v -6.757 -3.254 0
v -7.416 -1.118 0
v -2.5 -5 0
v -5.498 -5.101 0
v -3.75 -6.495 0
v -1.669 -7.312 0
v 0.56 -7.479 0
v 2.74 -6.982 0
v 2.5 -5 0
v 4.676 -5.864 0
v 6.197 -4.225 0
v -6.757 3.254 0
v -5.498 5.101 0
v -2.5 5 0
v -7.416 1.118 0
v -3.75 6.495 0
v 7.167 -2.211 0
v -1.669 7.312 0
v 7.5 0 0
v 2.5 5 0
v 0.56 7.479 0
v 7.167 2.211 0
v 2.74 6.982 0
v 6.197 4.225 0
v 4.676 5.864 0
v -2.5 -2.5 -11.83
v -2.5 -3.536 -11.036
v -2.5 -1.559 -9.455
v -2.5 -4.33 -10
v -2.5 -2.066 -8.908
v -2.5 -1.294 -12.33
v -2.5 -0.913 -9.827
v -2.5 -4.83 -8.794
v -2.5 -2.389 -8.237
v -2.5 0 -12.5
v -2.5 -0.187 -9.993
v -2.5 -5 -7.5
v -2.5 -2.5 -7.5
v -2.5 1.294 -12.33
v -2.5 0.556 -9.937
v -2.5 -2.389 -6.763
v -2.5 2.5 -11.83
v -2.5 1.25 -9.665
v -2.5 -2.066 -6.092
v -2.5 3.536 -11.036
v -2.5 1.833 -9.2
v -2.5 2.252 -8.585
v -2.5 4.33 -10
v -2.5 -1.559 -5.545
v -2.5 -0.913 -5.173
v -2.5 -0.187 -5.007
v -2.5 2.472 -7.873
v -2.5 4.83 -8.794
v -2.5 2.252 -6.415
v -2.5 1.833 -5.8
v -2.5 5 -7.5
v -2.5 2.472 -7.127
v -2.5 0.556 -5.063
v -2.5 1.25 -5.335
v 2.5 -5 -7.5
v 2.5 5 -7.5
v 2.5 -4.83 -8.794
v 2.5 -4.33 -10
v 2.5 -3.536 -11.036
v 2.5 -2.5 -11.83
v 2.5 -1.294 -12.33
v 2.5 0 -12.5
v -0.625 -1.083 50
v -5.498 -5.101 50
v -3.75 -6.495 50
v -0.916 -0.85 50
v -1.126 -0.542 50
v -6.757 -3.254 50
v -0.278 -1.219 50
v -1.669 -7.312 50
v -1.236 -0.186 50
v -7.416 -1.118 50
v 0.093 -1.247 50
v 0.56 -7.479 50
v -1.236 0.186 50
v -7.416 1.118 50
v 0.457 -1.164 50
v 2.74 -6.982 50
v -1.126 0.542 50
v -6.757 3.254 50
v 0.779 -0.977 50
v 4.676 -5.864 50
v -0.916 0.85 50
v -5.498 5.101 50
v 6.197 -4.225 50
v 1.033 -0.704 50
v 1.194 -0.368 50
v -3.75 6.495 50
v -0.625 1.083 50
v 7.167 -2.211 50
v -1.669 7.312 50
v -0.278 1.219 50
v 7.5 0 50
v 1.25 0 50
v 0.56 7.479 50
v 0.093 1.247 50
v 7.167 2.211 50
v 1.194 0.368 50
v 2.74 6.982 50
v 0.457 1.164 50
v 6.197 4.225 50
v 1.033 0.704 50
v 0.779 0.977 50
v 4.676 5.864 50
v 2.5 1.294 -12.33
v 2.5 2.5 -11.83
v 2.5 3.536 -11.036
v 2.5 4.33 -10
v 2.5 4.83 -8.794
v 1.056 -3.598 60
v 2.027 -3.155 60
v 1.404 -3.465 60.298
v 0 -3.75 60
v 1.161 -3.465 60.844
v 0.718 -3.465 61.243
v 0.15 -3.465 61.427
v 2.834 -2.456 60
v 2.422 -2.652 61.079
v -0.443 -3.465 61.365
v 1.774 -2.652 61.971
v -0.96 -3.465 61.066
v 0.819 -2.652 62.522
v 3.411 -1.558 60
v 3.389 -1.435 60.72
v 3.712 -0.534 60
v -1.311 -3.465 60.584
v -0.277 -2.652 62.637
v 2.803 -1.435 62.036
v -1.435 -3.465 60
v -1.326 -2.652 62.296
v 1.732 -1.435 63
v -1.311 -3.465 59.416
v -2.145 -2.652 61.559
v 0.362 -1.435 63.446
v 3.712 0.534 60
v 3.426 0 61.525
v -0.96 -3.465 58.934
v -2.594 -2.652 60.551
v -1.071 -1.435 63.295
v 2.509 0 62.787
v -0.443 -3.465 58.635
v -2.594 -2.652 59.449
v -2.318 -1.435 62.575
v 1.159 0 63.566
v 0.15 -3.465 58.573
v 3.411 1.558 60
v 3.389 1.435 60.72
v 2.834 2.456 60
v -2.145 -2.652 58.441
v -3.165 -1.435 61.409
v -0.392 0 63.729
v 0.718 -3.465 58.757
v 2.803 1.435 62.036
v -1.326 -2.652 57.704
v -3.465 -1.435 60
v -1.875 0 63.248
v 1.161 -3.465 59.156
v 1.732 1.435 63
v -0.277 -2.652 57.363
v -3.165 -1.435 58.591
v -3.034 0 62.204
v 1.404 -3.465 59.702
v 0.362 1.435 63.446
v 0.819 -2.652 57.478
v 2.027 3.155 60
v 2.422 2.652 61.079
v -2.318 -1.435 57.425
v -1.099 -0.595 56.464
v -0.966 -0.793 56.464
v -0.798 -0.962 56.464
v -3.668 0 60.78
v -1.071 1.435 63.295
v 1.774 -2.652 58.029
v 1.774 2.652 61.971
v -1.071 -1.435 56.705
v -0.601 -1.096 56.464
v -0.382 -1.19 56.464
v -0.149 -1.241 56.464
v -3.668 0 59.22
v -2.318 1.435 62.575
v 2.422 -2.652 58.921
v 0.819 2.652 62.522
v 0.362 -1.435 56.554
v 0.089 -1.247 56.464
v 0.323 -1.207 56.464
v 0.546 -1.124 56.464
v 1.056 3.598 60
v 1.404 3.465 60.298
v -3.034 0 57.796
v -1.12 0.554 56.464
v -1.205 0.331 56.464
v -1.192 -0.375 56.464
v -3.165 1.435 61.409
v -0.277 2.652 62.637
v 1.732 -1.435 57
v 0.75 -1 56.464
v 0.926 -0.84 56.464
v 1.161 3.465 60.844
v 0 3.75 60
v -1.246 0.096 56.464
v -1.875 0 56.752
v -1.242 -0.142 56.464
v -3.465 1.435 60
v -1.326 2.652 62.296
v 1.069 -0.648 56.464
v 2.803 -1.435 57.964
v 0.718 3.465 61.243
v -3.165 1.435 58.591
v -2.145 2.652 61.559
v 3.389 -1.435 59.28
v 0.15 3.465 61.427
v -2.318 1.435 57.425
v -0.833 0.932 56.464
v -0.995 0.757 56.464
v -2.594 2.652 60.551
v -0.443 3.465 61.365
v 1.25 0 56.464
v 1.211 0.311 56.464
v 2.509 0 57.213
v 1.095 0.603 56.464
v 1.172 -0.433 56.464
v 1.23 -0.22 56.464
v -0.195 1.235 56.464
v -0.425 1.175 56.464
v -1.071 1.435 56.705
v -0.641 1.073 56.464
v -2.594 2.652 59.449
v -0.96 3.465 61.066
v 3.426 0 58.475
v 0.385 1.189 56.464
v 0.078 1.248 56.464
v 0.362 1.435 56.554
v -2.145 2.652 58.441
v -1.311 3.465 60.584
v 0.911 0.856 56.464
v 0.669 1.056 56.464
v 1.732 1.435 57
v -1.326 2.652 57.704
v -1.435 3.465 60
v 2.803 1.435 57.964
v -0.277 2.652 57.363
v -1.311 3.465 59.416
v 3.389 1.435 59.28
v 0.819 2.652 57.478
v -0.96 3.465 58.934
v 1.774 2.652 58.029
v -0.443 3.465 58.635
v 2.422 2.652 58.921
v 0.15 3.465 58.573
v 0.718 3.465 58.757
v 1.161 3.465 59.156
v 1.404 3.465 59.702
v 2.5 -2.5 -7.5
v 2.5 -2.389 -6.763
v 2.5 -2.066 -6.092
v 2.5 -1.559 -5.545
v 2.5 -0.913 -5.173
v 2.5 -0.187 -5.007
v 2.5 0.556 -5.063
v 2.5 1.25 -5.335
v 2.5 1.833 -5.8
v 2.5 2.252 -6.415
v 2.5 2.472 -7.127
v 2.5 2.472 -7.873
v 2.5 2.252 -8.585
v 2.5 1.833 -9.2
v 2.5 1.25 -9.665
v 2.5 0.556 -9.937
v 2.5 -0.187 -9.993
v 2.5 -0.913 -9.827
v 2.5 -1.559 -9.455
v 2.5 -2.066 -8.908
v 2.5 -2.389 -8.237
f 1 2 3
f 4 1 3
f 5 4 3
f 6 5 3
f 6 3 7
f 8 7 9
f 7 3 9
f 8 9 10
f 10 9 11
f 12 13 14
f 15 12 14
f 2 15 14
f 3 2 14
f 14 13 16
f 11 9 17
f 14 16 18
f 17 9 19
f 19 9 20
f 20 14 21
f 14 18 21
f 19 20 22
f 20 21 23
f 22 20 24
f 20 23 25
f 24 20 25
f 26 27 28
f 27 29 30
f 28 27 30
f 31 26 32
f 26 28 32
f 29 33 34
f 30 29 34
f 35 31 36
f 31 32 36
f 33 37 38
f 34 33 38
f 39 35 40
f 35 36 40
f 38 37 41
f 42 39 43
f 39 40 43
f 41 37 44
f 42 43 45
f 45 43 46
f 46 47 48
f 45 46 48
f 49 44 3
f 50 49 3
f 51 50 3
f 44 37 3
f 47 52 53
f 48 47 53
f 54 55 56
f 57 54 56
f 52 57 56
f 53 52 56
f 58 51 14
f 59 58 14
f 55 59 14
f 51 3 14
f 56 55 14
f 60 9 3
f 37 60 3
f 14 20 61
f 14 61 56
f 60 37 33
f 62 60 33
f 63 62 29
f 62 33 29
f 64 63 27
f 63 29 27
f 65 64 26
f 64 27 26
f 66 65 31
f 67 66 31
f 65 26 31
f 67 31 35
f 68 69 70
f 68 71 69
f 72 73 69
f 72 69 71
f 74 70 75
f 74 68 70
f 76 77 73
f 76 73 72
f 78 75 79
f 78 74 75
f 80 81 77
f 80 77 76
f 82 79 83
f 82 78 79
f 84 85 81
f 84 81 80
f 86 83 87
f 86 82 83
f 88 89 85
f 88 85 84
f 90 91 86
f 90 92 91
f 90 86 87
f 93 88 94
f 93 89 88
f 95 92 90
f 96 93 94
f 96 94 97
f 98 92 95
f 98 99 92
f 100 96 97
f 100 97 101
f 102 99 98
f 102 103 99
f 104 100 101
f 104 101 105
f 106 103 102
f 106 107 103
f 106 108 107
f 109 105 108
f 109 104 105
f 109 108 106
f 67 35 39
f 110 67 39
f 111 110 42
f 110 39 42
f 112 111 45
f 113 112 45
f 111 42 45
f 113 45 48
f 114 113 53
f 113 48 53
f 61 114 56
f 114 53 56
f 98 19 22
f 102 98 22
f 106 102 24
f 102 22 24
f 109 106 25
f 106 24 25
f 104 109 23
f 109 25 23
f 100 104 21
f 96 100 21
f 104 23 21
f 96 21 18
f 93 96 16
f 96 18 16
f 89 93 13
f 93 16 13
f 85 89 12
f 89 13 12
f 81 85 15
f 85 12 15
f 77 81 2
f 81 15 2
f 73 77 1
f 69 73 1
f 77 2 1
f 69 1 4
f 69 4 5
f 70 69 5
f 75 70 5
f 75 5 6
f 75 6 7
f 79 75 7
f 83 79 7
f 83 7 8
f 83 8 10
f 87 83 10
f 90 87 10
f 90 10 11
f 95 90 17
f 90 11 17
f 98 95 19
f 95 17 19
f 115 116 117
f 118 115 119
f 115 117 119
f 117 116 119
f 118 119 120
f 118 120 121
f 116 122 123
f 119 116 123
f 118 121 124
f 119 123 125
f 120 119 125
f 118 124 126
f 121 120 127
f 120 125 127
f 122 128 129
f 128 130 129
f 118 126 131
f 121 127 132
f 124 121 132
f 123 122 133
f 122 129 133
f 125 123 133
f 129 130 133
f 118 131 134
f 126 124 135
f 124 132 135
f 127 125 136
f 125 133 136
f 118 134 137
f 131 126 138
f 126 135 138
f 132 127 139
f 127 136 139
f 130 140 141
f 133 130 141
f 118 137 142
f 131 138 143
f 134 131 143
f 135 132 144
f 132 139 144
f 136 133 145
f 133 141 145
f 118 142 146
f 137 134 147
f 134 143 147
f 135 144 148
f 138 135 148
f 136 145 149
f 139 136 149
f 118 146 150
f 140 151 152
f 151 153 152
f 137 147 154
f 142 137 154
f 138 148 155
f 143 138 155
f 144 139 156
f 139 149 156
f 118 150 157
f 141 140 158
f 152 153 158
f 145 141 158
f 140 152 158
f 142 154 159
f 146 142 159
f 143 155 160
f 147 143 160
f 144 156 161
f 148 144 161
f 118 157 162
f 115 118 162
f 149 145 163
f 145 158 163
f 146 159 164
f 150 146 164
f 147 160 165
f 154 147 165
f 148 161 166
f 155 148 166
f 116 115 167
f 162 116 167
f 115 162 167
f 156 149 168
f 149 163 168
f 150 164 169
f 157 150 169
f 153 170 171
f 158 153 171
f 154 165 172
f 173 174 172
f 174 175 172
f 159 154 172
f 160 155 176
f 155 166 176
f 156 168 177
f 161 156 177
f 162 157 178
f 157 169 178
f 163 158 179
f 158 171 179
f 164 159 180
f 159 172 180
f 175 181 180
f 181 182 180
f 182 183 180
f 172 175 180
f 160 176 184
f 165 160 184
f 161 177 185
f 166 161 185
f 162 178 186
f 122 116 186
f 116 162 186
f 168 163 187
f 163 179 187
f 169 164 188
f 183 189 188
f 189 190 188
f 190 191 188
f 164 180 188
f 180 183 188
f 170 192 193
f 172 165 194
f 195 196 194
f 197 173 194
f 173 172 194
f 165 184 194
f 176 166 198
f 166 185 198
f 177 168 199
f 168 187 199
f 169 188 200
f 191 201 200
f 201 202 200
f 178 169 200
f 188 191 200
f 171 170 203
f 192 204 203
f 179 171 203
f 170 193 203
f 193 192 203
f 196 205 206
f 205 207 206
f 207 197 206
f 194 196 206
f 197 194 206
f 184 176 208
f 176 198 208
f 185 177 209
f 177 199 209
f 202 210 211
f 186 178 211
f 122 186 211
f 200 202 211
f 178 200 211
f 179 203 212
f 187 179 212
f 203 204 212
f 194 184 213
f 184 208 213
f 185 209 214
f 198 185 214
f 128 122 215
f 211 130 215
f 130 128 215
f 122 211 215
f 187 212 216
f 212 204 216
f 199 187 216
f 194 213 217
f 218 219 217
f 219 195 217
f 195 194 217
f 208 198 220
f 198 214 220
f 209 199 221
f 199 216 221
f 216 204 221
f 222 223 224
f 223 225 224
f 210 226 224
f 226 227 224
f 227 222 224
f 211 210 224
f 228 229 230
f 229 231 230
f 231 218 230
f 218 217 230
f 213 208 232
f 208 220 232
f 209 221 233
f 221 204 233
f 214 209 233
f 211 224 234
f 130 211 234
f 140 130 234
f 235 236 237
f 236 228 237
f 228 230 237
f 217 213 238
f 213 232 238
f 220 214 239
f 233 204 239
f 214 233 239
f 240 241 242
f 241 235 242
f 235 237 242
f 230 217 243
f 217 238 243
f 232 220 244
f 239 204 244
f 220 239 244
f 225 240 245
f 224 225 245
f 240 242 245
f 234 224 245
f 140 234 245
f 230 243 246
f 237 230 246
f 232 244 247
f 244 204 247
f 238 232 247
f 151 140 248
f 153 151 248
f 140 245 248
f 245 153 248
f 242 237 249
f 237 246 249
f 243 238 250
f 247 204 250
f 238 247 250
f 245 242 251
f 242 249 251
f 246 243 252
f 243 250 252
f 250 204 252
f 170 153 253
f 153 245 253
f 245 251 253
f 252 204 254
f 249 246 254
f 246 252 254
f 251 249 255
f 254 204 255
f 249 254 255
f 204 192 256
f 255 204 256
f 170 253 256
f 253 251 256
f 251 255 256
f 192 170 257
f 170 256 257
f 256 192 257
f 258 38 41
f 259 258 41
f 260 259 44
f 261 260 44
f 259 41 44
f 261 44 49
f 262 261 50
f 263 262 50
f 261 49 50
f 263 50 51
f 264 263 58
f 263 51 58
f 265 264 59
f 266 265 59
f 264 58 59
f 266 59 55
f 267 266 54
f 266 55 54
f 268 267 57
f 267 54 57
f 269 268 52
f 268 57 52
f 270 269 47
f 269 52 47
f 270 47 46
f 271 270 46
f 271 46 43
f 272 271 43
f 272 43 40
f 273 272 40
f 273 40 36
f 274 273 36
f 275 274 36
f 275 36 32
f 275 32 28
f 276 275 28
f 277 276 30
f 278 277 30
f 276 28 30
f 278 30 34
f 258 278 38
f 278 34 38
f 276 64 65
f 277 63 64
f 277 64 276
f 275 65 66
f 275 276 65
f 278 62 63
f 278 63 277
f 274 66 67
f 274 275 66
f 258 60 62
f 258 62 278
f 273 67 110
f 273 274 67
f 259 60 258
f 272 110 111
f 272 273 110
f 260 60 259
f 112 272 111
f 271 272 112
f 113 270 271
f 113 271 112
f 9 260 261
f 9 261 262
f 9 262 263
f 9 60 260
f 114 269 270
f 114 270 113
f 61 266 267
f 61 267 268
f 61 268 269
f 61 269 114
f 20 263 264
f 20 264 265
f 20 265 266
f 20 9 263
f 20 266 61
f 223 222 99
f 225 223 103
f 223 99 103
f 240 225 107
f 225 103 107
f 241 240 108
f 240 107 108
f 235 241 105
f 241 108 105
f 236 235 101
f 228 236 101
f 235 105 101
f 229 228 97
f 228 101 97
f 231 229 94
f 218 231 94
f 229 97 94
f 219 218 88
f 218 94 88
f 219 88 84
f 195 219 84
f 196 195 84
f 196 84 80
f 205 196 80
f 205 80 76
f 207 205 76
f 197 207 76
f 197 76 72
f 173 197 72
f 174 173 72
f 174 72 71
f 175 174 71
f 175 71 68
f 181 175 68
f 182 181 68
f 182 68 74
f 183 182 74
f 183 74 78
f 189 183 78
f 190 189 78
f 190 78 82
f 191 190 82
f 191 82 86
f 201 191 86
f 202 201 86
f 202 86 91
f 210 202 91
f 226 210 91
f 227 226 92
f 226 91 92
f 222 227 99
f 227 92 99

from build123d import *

# Parameters (mm, degrees)
CROQUIS1_R              = 7.5
SALIENTE_EXTRUIR1_DEPTH = 50
CROQUIS4_W              = 5
CROQUIS4_H              = 10
SALIENTE_EXTRUIR2_DEPTH = 12.5
CROQUIS5_R              = 2.5
CORTAR_EXTRUIR1_DEPTH   = 5
CROQUIS6_R              = 1.25
SALIENTE_EXTRUIR3_DEPTH = 10


with BuildPart() as part:
    # Croquis1 → Saliente-Extruir1 (new body)
    with BuildSketch(Plane.XY):
        Circle(CROQUIS1_R)
    extrude(amount=SALIENTE_EXTRUIR1_DEPTH)

    # Croquis4 → Saliente-Extruir2 (add)
    with BuildSketch(Plane(origin=(0, 0, 0), x_dir=(-1, 0, 0), z_dir=(0, 0, -1))):
        Rectangle(CROQUIS4_W, CROQUIS4_H)
    extrude(amount=SALIENTE_EXTRUIR2_DEPTH)

    # Croquis5 → Cortar-Extruir1 (cut)
    with BuildSketch(Plane.ZY.offset(2.5)):
        with BuildLine():
            ThreePointArc((-7.5, -5), (-11.035533906, -3.535533906), (-12.5, 0))
            Line((-12.5, 0), (-12.5, -5))
            Line((-12.5, -5), (-7.5, -5))
        make_face()
        with BuildLine():
            ThreePointArc((-12.5, 0), (-11.035533906, 3.535533906), (-7.5, 5))
            Line((-7.5, 5), (-12.5, 5))
            Line((-12.5, 5), (-12.5, 0))
        make_face()
        with Locations(Location((-7.5, 0, 0), (0, 0, 270))):
            Circle(CROQUIS5_R)
    extrude(amount=-CORTAR_EXTRUIR1_DEPTH, mode=Mode.SUBTRACT)

    # Croquis6 → Saliente-Extruir3 (add)
    with BuildSketch(Plane.XY.offset(50)):
        Circle(CROQUIS6_R)
    extrude(amount=SALIENTE_EXTRUIR3_DEPTH)

    # Croquis7 → Revolución7 (revolve)
    with BuildSketch(Plane.XY.offset(60)):
        with BuildLine():
            Line((0, 3.75), (0, -3.75))
            ThreePointArc((0, -3.75), (3.75, 0), (0, 3.75))
        make_face()
    revolve(axis=Axis((0, 7.5, 60), (0, -1, 0)))


solid = part.part
